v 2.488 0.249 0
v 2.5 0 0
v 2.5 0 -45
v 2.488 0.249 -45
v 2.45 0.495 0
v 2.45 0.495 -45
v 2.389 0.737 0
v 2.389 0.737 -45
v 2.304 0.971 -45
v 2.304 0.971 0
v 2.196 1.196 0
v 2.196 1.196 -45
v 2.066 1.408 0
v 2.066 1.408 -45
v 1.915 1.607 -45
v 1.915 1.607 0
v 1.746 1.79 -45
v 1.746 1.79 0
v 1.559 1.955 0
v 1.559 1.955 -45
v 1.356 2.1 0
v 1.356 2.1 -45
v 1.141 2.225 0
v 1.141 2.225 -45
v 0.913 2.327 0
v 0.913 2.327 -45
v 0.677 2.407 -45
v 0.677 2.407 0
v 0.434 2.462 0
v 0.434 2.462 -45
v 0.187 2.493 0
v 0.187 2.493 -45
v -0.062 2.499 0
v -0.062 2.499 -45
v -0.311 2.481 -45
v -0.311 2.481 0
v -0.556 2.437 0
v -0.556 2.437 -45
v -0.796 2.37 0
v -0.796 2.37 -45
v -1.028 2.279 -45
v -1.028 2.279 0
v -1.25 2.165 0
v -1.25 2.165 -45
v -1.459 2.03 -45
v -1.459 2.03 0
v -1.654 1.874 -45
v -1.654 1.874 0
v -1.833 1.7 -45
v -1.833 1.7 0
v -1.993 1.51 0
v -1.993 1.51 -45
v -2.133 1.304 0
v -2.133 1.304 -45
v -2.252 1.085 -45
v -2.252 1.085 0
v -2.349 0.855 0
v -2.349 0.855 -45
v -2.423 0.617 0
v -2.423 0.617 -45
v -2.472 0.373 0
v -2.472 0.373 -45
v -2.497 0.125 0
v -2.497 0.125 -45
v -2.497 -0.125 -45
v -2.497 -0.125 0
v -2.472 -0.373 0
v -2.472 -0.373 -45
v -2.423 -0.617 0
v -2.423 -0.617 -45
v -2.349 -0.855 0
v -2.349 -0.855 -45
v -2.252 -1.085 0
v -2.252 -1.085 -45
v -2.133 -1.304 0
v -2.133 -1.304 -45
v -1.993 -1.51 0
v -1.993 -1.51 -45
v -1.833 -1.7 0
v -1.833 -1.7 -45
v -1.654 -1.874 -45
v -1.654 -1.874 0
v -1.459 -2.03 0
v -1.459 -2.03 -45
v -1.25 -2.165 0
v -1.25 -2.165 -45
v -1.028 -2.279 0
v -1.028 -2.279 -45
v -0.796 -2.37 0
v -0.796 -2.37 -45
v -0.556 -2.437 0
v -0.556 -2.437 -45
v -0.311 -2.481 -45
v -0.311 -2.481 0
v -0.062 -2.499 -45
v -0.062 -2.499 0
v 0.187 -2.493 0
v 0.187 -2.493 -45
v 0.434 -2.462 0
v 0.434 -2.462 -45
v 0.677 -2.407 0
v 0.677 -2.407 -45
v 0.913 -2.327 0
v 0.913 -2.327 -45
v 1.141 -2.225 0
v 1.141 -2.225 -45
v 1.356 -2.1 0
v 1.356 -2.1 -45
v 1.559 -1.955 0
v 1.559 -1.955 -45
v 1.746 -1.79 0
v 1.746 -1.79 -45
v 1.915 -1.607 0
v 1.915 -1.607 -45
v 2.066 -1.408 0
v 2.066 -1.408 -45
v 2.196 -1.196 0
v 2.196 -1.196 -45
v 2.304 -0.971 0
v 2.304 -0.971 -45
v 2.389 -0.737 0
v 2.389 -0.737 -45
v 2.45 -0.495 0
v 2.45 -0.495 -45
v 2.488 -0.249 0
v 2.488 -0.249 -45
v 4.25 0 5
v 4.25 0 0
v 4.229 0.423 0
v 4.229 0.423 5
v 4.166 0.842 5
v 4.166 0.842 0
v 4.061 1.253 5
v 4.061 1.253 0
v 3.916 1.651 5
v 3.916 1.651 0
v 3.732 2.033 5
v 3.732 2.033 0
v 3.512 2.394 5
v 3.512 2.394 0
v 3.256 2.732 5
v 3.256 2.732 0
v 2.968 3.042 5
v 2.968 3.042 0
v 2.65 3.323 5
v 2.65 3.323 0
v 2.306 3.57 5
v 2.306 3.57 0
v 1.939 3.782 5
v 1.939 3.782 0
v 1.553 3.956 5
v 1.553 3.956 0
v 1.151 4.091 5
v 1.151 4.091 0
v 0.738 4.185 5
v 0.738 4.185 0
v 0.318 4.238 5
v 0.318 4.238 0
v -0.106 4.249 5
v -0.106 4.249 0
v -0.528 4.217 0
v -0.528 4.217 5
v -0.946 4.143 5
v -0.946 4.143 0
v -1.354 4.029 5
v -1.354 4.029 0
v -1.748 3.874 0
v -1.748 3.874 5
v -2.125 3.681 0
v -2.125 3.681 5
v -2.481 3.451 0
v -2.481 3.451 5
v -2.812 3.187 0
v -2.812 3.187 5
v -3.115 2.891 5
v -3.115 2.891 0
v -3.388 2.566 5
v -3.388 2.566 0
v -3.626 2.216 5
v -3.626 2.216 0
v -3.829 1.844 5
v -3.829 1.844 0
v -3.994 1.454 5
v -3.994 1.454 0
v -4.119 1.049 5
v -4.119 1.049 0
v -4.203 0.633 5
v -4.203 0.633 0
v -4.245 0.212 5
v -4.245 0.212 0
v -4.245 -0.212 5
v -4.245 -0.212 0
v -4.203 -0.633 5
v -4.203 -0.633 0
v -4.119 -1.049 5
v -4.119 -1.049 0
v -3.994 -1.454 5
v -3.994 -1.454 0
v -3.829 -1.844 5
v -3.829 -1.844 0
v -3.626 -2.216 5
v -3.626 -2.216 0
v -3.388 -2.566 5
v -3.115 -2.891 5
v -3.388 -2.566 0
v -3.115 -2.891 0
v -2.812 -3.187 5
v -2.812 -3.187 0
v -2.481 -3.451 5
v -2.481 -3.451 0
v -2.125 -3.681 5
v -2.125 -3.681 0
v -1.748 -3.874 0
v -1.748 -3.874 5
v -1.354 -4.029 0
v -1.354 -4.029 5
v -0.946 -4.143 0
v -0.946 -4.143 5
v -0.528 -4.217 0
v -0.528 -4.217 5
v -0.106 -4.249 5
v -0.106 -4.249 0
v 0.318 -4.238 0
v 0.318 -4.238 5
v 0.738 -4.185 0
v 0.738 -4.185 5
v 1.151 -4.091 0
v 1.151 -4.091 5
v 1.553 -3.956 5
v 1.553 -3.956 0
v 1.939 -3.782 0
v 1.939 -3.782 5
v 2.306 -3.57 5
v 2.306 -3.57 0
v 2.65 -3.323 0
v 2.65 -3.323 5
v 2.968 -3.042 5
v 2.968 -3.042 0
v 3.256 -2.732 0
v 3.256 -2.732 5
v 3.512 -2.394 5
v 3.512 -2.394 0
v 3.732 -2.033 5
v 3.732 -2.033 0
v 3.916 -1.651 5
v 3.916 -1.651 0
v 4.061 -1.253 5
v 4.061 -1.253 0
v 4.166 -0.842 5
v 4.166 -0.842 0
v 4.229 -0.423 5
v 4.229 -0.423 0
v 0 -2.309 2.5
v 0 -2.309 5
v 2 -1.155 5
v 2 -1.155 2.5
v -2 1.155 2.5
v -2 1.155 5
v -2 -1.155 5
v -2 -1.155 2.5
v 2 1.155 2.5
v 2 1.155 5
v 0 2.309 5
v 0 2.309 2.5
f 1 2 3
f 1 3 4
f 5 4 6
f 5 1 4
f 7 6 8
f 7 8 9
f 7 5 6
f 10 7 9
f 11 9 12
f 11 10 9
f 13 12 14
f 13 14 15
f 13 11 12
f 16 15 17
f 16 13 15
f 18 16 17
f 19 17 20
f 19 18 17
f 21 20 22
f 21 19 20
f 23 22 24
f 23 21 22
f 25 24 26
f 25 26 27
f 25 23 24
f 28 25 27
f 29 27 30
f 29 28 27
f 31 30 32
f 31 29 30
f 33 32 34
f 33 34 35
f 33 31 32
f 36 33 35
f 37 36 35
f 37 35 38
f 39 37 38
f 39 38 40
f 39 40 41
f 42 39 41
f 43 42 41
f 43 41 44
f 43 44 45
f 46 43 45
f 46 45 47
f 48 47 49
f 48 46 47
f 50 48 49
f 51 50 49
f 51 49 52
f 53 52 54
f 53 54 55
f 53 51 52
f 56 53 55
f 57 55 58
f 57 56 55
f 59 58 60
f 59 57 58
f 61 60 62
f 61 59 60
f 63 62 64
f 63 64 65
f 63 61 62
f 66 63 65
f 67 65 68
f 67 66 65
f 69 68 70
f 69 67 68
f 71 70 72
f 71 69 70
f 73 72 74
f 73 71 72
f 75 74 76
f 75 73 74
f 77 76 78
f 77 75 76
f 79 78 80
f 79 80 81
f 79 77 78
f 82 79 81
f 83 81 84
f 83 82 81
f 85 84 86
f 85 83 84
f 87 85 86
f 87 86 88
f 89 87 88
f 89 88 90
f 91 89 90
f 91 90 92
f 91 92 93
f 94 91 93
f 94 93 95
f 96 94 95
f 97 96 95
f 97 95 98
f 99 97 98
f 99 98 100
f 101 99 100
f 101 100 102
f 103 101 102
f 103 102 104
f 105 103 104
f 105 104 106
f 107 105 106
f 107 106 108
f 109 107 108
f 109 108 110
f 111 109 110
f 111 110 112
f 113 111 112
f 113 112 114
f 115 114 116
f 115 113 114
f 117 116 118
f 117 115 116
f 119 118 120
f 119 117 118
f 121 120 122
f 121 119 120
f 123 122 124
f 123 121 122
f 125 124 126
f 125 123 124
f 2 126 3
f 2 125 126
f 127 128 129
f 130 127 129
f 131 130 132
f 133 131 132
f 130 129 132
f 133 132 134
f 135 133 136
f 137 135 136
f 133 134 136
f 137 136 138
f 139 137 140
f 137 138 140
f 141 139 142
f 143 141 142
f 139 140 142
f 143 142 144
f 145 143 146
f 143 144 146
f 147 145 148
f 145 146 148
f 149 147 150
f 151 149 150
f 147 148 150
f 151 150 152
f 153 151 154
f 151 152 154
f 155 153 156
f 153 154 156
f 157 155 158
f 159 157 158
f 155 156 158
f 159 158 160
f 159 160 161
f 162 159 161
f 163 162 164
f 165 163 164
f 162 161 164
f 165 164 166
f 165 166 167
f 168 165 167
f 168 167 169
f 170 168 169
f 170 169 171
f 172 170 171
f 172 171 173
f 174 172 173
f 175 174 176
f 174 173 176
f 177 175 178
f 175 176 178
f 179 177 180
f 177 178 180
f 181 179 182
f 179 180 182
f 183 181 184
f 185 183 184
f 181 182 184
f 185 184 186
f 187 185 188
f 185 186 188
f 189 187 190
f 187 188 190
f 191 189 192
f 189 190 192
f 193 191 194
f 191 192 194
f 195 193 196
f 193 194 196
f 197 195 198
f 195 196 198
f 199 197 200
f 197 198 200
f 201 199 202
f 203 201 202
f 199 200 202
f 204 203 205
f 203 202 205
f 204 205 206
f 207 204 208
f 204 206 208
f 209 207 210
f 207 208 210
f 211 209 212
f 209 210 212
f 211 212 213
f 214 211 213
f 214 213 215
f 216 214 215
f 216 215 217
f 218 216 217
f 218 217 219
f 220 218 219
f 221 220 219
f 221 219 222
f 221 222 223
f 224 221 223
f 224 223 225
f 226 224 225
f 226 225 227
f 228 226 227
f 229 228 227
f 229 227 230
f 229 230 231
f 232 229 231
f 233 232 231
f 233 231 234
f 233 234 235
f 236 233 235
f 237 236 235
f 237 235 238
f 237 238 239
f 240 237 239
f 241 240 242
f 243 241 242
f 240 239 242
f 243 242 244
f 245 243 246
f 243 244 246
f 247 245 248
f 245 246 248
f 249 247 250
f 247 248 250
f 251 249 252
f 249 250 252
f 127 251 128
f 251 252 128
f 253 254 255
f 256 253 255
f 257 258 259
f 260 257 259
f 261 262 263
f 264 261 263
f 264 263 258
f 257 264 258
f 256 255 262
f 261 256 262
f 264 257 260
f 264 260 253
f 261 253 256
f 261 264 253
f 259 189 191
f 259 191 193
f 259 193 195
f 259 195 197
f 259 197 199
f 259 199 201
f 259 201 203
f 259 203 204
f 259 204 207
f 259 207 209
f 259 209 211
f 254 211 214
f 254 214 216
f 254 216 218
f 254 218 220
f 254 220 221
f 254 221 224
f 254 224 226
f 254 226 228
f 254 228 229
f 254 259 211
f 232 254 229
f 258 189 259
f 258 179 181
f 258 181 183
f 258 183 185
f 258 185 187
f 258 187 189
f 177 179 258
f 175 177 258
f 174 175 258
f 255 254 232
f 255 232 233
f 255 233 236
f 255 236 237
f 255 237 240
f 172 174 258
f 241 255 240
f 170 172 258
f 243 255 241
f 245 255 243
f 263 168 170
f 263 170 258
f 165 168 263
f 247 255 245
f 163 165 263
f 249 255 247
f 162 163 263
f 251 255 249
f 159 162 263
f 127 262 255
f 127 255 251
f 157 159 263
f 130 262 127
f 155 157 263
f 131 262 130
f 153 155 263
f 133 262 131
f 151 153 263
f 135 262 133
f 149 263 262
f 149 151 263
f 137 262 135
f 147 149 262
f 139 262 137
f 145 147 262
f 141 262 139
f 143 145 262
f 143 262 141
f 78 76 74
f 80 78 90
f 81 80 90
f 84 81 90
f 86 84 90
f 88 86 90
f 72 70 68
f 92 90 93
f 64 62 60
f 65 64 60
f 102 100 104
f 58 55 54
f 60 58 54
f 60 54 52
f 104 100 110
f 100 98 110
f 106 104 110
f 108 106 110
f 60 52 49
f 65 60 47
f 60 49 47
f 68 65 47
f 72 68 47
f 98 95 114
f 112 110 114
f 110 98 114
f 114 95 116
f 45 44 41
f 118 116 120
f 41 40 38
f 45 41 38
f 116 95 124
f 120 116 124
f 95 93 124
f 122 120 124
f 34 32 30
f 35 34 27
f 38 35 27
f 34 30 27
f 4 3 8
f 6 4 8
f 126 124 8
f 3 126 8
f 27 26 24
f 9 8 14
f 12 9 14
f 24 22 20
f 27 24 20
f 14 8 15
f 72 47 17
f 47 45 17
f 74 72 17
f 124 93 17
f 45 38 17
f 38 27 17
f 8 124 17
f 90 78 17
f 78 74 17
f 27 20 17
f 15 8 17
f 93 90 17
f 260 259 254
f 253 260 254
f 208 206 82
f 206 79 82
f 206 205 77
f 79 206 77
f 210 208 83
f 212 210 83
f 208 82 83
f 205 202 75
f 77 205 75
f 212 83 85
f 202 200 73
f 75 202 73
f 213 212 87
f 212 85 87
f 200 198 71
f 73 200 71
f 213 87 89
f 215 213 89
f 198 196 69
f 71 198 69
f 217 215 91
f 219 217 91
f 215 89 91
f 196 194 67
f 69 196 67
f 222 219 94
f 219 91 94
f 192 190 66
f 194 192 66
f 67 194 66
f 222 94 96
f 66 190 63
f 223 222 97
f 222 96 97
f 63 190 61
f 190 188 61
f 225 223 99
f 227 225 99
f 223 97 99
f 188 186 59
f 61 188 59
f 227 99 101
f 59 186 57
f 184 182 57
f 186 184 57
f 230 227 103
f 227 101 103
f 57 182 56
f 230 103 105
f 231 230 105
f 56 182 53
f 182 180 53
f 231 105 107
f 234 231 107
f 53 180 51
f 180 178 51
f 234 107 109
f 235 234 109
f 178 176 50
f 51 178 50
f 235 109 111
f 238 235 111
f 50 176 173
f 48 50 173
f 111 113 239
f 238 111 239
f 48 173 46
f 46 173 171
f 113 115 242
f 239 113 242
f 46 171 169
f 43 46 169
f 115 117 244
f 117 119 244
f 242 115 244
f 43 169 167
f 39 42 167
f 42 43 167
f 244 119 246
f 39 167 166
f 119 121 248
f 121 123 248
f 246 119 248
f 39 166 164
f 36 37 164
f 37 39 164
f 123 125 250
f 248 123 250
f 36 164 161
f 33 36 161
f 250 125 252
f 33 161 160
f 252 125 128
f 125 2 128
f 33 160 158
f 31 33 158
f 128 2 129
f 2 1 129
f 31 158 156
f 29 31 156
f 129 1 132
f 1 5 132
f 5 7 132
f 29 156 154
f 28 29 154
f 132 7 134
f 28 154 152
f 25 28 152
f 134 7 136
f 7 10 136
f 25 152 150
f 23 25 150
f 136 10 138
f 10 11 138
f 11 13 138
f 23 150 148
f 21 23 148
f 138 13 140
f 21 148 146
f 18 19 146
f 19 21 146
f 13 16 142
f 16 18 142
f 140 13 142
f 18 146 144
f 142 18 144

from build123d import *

# Parameters (mm, degrees)
SKETCH_R     = 4.25
PAD_DEPTH    = 5
POCKET_DEPTH = 2.5
SKETCH002_R  = 2.5
PAD001_DEPTH = 45


with BuildPart() as part:
    # Sketch → Pad (new body)
    with BuildSketch(Plane.XY):
        Circle(SKETCH_R)
    extrude(amount=PAD_DEPTH)

    # Sketch001 → Pocket (cut)
    with BuildSketch(Plane.XY.offset(5)):
        Polygon((0, -2.309401), (2, -1.154701), (2, 1.154701), (0, 2.309401), (-2, 1.154701), (-2, -1.154701), align=None)
    extrude(amount=-POCKET_DEPTH, mode=Mode.SUBTRACT)

    # Sketch002 → Pad001 (join)
    with BuildSketch(Plane.XY):
        Circle(SKETCH002_R)
    extrude(amount=-PAD001_DEPTH)


solid = part.part
